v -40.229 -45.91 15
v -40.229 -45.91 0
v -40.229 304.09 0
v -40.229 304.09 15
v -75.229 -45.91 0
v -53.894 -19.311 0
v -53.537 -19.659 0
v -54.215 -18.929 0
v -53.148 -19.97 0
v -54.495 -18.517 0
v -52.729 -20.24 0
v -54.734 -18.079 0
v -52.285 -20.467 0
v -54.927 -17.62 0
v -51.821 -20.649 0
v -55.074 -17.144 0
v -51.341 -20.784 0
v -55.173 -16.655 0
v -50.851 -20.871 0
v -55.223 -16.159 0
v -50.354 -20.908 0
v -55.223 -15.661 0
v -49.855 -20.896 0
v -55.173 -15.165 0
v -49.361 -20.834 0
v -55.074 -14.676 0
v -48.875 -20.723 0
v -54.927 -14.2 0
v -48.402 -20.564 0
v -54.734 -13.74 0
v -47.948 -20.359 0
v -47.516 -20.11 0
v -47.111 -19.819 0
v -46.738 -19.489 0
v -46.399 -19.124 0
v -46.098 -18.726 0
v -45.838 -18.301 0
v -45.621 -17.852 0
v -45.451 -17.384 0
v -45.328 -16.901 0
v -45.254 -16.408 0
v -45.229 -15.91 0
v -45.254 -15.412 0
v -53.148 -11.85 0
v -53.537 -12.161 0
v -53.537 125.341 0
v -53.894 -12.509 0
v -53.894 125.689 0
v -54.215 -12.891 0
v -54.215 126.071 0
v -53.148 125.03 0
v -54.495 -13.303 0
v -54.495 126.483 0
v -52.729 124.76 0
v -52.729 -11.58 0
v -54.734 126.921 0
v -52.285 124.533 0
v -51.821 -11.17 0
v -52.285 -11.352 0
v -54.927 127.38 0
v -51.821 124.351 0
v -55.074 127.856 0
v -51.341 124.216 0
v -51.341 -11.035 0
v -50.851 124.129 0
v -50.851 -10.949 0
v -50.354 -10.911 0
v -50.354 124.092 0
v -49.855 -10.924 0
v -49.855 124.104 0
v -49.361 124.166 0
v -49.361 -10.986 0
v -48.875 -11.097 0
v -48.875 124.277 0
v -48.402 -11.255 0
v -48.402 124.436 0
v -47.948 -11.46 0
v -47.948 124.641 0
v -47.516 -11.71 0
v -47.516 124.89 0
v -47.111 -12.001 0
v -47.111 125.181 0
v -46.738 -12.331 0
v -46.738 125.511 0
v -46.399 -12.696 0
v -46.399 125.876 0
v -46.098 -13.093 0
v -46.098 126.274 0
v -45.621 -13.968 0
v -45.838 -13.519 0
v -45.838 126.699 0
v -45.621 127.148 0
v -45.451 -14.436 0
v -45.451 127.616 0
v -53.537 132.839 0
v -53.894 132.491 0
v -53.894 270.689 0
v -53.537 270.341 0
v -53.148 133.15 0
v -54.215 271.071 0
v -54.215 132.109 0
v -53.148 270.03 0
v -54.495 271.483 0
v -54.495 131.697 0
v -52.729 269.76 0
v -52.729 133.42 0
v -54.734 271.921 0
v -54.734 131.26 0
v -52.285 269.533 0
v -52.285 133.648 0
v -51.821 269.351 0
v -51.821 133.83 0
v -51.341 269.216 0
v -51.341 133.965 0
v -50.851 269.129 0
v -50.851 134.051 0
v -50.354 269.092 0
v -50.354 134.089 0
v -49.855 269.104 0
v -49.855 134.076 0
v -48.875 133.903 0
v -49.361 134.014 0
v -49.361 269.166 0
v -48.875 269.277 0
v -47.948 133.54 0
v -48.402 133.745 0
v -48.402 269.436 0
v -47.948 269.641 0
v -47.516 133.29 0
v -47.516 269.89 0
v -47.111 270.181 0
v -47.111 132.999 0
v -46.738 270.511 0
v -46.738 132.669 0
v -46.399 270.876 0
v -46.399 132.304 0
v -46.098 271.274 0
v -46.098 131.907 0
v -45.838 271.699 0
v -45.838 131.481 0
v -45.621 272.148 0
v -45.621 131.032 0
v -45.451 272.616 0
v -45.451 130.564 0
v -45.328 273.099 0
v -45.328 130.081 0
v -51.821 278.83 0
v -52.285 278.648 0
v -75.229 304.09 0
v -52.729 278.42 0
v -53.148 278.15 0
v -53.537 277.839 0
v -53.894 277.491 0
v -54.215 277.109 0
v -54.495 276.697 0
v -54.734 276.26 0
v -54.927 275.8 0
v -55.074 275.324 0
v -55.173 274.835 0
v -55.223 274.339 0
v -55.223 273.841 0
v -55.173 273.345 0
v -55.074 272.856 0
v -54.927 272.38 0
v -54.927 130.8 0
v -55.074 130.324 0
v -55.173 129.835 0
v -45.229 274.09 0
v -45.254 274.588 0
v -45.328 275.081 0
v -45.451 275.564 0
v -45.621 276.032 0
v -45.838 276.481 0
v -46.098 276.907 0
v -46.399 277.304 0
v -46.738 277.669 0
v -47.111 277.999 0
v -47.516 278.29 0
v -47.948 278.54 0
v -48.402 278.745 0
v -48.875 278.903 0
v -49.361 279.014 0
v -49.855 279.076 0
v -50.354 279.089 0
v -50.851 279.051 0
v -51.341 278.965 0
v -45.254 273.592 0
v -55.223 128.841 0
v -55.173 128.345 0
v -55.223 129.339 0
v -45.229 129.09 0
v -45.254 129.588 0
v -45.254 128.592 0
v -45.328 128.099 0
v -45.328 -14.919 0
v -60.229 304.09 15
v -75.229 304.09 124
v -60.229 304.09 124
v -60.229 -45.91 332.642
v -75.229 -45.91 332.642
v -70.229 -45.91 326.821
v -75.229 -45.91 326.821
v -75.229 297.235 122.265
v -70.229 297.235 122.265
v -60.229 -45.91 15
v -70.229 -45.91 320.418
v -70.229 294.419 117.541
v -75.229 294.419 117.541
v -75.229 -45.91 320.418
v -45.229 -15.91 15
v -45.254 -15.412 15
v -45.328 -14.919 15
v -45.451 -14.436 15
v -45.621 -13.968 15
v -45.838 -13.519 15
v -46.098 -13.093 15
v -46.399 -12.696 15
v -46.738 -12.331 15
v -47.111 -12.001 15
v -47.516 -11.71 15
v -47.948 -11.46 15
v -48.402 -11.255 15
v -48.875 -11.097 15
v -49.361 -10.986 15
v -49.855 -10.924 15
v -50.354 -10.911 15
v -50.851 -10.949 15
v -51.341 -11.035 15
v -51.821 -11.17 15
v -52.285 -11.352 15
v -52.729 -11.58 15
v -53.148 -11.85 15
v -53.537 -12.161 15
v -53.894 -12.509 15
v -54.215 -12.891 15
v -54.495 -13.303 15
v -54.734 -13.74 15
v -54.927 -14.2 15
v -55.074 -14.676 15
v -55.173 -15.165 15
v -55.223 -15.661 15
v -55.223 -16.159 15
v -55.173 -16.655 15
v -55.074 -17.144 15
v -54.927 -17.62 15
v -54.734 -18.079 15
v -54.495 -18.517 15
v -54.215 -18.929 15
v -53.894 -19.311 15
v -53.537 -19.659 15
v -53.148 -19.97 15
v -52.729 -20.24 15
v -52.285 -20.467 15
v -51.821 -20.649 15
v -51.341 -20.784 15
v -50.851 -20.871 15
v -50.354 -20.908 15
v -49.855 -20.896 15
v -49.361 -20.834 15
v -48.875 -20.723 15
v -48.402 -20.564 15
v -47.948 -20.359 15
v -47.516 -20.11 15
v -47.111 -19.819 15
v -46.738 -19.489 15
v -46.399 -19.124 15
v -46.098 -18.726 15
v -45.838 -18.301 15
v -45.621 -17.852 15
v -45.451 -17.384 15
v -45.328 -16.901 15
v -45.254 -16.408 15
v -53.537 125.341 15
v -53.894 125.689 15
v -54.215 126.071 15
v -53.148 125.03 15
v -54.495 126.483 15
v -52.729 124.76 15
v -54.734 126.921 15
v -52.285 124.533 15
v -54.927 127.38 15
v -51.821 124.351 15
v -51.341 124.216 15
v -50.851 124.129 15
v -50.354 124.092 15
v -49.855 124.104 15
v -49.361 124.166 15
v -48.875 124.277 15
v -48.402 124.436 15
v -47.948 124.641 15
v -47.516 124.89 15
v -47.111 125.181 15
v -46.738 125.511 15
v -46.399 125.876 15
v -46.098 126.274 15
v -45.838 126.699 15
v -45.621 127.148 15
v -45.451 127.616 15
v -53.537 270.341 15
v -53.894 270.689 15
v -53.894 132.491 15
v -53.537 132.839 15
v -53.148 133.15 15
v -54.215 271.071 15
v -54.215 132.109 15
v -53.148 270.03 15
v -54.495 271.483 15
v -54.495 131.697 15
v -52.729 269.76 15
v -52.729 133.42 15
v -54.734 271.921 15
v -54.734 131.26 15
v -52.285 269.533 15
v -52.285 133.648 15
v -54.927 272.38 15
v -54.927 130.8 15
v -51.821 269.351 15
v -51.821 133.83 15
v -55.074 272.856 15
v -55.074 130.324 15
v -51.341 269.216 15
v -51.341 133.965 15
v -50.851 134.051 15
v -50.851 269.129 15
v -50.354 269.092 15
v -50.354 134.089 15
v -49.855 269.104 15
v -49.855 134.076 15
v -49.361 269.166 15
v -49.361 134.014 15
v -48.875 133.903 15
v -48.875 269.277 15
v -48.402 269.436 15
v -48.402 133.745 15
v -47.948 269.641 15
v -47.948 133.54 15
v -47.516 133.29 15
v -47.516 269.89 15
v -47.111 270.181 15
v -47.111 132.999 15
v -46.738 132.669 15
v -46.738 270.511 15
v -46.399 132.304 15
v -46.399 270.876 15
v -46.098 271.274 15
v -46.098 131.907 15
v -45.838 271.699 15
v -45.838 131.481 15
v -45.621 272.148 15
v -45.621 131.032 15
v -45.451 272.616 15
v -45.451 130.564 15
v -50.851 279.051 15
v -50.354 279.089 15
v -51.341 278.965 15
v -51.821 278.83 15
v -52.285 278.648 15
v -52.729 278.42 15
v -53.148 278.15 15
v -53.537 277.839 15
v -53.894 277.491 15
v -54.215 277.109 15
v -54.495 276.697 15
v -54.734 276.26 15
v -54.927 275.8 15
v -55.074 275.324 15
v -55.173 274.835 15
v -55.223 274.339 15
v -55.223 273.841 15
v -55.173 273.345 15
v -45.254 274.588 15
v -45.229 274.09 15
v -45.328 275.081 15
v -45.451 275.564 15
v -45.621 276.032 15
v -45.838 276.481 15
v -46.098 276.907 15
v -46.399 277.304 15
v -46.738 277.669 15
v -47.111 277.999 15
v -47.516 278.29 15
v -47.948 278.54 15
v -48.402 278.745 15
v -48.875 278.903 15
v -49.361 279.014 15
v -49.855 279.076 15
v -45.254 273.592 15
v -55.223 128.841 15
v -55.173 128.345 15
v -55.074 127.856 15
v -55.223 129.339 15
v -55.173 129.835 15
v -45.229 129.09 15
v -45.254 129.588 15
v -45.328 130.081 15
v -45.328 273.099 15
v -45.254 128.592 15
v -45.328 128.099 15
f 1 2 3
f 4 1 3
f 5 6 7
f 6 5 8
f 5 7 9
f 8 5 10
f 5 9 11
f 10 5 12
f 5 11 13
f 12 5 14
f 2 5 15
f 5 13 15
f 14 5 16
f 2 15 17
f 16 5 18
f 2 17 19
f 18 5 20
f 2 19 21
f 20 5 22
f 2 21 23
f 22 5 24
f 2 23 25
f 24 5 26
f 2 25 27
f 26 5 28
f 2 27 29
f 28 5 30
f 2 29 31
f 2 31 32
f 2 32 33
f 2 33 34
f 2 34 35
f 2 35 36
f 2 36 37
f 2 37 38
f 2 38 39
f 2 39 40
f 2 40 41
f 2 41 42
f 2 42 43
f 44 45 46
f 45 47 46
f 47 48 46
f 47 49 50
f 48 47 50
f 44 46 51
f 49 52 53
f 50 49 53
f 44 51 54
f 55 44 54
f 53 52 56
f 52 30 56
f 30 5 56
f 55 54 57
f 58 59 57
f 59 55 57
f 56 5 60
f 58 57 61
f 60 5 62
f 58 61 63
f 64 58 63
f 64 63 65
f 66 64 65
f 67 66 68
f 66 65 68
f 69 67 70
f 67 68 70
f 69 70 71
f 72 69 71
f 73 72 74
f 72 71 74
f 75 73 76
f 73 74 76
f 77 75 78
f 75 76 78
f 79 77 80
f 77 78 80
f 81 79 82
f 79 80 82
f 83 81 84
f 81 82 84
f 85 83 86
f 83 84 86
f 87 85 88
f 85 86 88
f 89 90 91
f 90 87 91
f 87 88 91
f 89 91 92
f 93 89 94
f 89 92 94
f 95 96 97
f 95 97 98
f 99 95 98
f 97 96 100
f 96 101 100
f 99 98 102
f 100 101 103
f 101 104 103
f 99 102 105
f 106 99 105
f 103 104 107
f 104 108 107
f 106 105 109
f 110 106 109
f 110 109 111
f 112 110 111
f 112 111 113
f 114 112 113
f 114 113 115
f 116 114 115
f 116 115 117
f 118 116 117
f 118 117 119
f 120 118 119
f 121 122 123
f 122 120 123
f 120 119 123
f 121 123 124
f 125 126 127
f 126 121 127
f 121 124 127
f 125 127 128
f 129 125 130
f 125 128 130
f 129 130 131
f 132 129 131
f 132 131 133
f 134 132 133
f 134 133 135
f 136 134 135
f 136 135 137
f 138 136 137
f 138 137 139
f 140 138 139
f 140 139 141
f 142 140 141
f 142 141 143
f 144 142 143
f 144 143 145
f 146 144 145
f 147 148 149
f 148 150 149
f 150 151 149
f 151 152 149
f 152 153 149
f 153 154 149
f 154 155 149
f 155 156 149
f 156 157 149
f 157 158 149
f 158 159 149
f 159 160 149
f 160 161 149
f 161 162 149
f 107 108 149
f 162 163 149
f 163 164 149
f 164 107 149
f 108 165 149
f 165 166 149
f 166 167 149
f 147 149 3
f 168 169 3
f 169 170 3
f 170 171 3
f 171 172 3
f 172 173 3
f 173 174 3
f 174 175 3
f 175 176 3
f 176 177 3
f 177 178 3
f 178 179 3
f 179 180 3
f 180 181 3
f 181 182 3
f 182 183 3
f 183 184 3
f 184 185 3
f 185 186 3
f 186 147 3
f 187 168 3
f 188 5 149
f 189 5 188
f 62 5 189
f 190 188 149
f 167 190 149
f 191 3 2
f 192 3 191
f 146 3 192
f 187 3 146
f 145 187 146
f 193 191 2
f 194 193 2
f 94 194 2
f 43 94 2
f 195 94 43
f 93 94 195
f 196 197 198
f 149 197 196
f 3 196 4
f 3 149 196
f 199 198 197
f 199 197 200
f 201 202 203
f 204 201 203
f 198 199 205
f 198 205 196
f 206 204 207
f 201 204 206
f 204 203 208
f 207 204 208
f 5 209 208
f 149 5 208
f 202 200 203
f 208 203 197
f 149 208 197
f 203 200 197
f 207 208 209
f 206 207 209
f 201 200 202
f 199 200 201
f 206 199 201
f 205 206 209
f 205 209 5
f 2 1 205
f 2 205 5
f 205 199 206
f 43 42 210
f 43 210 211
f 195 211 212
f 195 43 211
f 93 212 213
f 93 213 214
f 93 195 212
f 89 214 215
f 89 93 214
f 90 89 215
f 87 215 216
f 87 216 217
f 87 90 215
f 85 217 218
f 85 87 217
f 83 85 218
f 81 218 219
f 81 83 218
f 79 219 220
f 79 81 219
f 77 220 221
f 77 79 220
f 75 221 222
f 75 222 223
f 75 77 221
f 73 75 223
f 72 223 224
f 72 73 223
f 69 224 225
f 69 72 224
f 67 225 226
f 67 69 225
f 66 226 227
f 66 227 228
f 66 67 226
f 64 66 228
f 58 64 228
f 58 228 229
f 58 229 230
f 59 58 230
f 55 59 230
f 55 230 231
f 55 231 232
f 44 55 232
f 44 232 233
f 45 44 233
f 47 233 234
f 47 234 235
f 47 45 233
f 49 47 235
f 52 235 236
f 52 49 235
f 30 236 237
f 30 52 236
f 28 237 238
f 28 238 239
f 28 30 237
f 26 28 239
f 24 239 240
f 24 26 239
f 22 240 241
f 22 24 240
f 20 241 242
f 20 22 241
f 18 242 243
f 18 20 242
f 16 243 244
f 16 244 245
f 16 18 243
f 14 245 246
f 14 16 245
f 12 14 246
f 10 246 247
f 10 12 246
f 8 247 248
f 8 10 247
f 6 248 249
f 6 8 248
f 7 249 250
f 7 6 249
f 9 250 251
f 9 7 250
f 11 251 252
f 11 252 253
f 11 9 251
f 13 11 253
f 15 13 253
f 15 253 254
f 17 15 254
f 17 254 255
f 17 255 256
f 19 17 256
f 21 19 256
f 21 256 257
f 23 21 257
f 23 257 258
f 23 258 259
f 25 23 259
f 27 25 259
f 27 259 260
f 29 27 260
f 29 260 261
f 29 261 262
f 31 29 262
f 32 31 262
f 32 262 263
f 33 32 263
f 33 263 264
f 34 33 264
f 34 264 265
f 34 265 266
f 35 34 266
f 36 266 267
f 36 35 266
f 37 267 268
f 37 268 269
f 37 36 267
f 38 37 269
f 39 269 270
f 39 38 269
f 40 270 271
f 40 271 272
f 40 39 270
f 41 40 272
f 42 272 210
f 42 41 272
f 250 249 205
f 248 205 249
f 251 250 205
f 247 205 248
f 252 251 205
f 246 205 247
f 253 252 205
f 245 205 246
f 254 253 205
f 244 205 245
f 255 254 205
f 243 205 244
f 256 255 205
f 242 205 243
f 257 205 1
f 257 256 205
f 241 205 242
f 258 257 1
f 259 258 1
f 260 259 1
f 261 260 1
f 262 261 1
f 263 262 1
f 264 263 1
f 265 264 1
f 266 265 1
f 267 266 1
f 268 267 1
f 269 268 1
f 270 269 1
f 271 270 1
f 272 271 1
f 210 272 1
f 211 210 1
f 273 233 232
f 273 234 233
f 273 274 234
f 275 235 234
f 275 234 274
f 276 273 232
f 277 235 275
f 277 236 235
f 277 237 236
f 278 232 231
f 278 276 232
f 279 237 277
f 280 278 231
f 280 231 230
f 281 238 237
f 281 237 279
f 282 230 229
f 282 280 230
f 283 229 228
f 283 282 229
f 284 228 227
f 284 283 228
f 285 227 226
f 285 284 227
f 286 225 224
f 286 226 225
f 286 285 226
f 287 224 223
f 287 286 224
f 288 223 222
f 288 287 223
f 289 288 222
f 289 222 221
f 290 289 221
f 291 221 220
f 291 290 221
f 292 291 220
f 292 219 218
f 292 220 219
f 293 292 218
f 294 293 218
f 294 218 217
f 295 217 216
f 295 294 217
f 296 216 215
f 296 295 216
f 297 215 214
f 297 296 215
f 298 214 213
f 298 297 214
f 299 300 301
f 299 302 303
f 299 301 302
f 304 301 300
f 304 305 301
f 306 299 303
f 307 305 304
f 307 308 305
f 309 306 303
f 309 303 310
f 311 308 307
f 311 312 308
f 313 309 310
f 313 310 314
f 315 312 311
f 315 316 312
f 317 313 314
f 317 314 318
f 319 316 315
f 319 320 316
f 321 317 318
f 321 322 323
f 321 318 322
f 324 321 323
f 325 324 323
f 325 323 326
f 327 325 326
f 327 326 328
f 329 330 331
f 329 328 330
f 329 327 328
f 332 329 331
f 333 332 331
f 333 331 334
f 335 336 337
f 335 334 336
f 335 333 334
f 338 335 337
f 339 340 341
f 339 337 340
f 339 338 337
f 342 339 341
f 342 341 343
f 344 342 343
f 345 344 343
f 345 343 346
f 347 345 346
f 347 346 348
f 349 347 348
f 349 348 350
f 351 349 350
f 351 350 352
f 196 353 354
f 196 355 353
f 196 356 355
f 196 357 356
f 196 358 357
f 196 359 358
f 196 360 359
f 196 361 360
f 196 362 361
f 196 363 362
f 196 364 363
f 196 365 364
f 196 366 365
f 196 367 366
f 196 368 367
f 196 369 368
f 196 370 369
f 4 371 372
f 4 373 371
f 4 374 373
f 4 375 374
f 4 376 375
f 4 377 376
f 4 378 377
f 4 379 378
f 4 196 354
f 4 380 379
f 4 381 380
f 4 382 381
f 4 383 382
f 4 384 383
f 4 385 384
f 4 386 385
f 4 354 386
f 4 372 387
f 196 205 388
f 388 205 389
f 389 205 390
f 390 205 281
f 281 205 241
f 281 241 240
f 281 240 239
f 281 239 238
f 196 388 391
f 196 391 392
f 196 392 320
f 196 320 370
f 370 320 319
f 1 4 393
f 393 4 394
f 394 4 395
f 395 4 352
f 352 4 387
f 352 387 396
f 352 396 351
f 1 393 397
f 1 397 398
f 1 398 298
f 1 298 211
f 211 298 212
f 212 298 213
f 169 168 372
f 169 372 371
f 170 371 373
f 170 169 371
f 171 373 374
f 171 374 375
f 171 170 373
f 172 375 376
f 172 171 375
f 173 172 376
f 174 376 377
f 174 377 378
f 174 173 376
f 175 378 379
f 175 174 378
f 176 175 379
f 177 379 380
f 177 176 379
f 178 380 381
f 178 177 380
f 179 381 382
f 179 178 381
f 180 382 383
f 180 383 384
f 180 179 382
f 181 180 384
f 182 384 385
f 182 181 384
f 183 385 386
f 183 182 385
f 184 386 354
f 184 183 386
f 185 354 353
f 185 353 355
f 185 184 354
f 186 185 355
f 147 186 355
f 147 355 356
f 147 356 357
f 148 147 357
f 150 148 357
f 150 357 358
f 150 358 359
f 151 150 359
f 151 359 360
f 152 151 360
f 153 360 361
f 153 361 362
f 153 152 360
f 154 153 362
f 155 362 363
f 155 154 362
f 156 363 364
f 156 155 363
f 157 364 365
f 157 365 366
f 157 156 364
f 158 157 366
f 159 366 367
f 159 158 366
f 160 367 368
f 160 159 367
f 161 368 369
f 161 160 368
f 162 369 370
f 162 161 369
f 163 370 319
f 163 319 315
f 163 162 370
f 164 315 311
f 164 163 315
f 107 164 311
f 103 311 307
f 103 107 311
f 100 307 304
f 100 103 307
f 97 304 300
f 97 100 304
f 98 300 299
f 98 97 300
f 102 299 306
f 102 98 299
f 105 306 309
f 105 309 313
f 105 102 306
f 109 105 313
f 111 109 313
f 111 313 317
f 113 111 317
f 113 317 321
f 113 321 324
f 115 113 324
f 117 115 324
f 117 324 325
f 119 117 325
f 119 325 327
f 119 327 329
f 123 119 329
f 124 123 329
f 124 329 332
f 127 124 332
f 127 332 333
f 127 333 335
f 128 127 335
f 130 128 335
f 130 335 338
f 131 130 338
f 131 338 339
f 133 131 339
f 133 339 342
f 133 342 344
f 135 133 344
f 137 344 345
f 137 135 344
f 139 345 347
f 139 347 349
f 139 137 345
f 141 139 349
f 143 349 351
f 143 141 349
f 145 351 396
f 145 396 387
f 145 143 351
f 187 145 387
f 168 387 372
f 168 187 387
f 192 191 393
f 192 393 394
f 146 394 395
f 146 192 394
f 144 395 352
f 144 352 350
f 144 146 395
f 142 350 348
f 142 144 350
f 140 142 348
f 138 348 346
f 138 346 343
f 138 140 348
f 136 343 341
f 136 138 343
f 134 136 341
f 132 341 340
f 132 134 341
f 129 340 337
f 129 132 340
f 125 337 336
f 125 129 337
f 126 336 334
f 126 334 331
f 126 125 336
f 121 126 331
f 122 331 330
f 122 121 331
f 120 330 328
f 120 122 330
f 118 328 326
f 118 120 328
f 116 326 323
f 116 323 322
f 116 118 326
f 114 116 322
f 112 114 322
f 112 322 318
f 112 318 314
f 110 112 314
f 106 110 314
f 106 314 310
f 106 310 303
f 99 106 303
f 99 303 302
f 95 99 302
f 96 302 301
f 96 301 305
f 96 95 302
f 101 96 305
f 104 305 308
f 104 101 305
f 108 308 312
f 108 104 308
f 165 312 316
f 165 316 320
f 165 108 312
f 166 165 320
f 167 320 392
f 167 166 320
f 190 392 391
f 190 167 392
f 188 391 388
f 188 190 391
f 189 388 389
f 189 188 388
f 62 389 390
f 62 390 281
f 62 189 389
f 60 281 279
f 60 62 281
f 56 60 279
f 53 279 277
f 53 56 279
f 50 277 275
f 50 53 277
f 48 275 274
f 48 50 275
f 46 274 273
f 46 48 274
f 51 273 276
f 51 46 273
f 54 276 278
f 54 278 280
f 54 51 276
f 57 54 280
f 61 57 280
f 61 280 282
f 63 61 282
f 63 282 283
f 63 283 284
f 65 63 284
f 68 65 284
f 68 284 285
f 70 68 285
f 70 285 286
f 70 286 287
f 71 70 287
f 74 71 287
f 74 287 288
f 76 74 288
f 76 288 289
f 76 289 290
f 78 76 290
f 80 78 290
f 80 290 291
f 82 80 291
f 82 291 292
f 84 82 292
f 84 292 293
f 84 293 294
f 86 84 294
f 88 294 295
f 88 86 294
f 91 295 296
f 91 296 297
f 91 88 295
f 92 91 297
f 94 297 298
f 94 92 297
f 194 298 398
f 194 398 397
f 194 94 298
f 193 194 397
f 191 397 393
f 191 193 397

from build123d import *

# Parameters (mm, degrees)
F0_W     = 35
F0_H     = 350
F0_R     = 5
F1_DEPTH = 15
F2_W     = 15
F2_H     = 350
F3_DEPTH = 109
F5_DEPTH = 15
F7_DEPTH = 5


with BuildPart() as f1:
    # F0 (on Top) → F1 (new body)
    with BuildSketch(Plane.XY):
        with Locations((-57.72887, 129.090141)):
            Rectangle(F0_W, F0_H)
        with Locations((-50.22887, -15.909859)):
            Circle(F0_R, mode=Mode.SUBTRACT)
        with Locations((-50.22887, 129.090141)):
            Circle(F0_R, mode=Mode.SUBTRACT)
        with Locations((-50.22887, 274.090141)):
            Circle(F0_R, mode=Mode.SUBTRACT)
    extrude(amount=F1_DEPTH)

    # F2 (on face) → F3 (join)
    with BuildSketch(Plane.XY.offset(15)):
        with Locations((-67.72887, 129.090141)):
            Rectangle(F2_W, F2_H)
    extrude(amount=F3_DEPTH)

    # F4 (on face) → F5 (join)
    with BuildSketch(Plane.YZ.offset(-60.22887)):
        Polygon((-45.909859, 332.642), (-45.909859, 124), (304.090141, 124), align=None)
    extrude(amount=-F5_DEPTH)

    # F6 (on face) → F7 (cut)
    with BuildSketch(Plane(origin=(-75.22887, 0, 0), x_dir=(0, -1, 0), z_dir=(-1, 0, 0))):
        Polygon((45.909859, 320.417912), (45.909859, 326.821006), (-297.235123, 122.265419), (-294.418886, 117.54114), align=None)
    extrude(amount=-F7_DEPTH, mode=Mode.SUBTRACT)


solid = f1.part
